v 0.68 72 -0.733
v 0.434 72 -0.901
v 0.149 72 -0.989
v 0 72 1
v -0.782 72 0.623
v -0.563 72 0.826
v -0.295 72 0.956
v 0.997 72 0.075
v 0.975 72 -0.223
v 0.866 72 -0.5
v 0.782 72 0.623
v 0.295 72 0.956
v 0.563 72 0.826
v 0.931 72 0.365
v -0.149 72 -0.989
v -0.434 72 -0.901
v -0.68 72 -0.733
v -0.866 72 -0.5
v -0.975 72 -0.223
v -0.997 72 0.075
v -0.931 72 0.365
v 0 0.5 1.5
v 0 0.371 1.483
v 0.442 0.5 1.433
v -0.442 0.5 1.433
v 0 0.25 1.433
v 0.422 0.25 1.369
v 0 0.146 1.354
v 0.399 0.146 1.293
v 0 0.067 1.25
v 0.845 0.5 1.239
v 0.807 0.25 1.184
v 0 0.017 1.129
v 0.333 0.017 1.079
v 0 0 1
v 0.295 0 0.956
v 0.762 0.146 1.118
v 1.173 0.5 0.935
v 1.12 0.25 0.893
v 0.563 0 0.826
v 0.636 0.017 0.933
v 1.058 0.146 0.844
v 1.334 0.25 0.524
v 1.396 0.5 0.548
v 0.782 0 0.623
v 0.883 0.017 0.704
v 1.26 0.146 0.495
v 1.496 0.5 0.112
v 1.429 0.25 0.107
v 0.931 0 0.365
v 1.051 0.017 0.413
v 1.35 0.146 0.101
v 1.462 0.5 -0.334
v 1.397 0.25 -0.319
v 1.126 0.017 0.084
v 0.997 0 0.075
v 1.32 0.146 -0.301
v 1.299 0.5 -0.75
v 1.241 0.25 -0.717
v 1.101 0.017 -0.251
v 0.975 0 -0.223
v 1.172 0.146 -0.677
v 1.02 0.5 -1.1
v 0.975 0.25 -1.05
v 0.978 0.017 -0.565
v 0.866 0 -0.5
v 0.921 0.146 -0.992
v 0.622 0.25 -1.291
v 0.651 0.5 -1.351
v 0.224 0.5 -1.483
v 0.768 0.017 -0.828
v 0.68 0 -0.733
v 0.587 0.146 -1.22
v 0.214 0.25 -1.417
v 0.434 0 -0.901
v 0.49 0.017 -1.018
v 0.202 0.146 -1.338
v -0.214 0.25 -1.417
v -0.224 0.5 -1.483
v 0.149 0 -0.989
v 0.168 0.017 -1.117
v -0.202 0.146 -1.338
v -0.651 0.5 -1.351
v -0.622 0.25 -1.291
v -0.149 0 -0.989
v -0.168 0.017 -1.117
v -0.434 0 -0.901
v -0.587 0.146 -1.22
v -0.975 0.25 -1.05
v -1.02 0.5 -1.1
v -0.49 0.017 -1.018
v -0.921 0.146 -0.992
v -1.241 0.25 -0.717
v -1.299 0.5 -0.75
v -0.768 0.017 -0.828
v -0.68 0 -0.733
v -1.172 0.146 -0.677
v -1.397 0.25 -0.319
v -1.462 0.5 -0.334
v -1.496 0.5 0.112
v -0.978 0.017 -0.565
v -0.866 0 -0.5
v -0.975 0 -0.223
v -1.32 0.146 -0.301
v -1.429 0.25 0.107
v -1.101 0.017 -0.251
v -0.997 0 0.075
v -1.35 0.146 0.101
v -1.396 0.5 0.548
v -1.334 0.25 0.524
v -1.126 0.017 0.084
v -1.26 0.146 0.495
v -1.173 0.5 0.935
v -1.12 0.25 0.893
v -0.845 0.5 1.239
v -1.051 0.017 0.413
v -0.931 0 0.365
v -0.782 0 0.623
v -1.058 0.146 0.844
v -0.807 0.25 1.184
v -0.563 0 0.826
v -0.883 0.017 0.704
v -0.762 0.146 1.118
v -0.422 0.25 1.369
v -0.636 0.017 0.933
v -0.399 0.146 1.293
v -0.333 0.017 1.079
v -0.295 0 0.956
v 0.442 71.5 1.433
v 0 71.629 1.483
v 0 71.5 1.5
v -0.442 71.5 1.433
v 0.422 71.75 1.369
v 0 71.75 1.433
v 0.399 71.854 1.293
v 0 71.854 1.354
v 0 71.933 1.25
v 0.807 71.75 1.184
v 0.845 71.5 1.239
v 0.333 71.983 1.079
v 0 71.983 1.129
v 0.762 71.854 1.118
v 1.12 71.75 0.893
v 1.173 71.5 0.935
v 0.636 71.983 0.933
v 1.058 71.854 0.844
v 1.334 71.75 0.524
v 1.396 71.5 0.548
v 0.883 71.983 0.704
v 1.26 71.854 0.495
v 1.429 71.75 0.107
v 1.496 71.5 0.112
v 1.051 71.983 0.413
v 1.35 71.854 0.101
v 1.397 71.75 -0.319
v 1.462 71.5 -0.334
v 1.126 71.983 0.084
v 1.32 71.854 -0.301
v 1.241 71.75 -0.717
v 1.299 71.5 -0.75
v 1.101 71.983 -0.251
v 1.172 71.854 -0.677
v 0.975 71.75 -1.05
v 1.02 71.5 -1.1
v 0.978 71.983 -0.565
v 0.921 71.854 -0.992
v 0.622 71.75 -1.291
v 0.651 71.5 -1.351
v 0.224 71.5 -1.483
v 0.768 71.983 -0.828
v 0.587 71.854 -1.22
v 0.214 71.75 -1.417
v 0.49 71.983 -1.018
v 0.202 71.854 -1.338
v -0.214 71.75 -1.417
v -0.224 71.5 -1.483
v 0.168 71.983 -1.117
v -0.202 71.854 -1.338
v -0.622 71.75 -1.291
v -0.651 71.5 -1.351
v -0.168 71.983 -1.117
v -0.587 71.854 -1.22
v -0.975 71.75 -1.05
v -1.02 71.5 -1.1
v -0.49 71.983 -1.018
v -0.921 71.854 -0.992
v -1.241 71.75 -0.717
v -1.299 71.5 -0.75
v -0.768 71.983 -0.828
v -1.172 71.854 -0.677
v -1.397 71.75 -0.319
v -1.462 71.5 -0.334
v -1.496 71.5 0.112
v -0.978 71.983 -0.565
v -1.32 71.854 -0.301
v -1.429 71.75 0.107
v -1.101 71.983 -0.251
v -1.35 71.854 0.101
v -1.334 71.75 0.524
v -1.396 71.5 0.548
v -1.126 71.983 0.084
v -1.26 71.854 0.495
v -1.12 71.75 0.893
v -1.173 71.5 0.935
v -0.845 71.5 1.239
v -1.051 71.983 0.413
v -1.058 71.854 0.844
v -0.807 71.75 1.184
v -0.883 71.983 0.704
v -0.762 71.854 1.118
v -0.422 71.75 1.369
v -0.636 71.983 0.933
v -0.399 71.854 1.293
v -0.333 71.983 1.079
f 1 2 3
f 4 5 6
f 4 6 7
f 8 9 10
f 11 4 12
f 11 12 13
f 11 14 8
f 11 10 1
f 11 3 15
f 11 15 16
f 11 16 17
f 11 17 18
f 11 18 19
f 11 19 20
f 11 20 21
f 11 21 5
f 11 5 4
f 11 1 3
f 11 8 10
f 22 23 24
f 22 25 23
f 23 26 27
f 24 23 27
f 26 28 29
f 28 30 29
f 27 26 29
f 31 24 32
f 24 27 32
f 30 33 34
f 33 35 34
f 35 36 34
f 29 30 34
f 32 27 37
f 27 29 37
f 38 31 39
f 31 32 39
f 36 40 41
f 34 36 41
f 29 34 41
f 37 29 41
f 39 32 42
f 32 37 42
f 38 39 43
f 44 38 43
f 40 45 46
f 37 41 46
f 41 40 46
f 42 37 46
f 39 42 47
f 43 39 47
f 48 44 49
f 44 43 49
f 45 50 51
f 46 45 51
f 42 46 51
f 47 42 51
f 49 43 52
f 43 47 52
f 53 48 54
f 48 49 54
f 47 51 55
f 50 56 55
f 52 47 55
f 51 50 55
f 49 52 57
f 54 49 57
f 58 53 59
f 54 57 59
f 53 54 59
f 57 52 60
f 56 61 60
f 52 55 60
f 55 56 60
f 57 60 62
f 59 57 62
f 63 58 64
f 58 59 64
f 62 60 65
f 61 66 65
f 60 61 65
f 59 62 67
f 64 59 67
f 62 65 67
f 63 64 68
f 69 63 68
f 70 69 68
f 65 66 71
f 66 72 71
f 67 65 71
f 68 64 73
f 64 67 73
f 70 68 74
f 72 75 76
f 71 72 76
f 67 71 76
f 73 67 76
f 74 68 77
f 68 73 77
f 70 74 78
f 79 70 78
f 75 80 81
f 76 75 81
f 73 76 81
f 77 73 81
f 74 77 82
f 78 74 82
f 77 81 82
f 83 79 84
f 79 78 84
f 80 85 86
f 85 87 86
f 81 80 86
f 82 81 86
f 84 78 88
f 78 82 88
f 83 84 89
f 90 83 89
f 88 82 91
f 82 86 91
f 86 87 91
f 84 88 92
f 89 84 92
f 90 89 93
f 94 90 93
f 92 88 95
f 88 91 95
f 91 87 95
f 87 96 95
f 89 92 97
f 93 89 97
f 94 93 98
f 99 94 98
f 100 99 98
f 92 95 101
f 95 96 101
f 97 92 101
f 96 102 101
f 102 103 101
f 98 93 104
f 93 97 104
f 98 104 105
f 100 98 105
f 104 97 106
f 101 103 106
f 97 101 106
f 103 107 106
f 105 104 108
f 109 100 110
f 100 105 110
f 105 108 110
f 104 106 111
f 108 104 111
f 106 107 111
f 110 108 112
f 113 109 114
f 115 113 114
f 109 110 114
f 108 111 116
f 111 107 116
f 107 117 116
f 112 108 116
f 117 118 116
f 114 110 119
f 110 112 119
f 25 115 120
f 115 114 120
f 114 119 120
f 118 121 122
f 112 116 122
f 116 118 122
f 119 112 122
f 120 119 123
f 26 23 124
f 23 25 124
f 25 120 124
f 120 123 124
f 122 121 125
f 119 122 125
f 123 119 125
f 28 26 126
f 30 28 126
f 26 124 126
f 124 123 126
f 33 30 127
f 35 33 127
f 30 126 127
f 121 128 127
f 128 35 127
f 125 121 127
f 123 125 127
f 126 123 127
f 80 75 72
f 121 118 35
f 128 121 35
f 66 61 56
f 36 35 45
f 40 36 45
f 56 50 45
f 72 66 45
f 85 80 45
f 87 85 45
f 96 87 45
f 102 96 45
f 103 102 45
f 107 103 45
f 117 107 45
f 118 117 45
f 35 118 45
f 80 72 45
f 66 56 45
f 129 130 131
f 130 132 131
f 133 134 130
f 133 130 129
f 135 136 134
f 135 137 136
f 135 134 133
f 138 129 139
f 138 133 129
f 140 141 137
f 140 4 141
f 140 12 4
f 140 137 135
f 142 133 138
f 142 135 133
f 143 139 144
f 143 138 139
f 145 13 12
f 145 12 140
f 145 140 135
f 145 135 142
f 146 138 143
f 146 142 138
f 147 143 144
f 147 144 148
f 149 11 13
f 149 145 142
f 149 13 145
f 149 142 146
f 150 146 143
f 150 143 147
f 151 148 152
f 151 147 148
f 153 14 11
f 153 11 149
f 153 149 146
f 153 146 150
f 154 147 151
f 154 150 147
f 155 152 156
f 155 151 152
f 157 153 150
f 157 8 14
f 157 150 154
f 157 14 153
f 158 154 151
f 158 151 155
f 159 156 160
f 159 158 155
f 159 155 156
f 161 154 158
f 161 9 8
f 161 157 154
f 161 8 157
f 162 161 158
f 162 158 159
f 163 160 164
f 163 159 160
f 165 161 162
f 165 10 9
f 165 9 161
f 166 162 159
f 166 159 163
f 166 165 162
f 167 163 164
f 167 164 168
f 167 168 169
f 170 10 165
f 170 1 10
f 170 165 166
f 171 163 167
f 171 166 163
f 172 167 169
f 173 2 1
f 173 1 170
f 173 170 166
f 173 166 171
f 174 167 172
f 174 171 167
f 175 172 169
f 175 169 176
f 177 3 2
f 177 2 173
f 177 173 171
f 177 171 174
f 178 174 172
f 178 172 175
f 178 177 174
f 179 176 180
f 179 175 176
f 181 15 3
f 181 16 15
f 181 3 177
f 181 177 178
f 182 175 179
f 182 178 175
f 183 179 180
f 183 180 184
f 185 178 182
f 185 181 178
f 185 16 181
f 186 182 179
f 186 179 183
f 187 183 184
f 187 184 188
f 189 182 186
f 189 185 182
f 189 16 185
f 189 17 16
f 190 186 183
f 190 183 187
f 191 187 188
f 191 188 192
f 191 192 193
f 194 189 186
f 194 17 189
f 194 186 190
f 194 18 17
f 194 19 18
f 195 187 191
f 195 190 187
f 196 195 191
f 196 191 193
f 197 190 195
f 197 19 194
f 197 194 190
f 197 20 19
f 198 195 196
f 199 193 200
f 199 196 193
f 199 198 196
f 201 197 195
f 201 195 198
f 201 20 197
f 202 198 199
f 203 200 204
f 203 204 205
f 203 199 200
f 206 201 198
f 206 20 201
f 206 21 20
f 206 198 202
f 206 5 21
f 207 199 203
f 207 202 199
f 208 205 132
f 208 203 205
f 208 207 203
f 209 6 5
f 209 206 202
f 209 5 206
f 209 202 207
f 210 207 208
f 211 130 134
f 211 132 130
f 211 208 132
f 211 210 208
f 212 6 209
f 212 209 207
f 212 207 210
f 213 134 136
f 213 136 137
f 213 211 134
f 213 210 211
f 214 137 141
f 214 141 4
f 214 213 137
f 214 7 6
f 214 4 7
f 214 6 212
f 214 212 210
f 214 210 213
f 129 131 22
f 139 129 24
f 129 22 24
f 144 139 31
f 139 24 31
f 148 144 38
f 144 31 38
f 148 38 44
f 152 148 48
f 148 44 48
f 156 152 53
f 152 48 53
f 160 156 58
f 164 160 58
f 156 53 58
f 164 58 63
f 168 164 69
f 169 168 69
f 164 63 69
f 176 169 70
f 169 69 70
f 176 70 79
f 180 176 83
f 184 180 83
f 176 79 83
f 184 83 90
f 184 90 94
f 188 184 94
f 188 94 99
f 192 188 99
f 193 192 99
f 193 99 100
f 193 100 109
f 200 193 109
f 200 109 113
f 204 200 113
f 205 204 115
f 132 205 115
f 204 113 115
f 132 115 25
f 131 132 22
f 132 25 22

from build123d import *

# Parameters (mm, degrees)
IZIM1_R                     = 1.5
Y_KSEKLIK_EKSTR_ZYON1_DEPTH = 72
RADYUS1_R                   = 0.5
RADYUS2_R                   = 0.5


with BuildPart() as part:
    # Çizim1 → Yükseklik-Ekstrüzyon1 (new body)
    with BuildSketch(Plane(origin=(0, 0, 0), x_dir=(1, 0, 0), z_dir=(0, 1, 0))):
        with Locations(Location((0, 0, 0), (0, 0, 270))):
            Circle(IZIM1_R)
    extrude(amount=Y_KSEKLIK_EKSTR_ZYON1_DEPTH)

    # Radyus1
    radyus1_edges = [part.edges().sort_by_distance(p)[0] for p in [
        (0, 72, -1.5),
    ]]
    fillet(radyus1_edges, radius=RADYUS1_R)

    # Radyus2
    radyus2_edges = [part.edges().sort_by_distance(p)[0] for p in [
        (0, 0, -1.5),
    ]]
    fillet(radyus2_edges, radius=RADYUS2_R)


solid = part.part
